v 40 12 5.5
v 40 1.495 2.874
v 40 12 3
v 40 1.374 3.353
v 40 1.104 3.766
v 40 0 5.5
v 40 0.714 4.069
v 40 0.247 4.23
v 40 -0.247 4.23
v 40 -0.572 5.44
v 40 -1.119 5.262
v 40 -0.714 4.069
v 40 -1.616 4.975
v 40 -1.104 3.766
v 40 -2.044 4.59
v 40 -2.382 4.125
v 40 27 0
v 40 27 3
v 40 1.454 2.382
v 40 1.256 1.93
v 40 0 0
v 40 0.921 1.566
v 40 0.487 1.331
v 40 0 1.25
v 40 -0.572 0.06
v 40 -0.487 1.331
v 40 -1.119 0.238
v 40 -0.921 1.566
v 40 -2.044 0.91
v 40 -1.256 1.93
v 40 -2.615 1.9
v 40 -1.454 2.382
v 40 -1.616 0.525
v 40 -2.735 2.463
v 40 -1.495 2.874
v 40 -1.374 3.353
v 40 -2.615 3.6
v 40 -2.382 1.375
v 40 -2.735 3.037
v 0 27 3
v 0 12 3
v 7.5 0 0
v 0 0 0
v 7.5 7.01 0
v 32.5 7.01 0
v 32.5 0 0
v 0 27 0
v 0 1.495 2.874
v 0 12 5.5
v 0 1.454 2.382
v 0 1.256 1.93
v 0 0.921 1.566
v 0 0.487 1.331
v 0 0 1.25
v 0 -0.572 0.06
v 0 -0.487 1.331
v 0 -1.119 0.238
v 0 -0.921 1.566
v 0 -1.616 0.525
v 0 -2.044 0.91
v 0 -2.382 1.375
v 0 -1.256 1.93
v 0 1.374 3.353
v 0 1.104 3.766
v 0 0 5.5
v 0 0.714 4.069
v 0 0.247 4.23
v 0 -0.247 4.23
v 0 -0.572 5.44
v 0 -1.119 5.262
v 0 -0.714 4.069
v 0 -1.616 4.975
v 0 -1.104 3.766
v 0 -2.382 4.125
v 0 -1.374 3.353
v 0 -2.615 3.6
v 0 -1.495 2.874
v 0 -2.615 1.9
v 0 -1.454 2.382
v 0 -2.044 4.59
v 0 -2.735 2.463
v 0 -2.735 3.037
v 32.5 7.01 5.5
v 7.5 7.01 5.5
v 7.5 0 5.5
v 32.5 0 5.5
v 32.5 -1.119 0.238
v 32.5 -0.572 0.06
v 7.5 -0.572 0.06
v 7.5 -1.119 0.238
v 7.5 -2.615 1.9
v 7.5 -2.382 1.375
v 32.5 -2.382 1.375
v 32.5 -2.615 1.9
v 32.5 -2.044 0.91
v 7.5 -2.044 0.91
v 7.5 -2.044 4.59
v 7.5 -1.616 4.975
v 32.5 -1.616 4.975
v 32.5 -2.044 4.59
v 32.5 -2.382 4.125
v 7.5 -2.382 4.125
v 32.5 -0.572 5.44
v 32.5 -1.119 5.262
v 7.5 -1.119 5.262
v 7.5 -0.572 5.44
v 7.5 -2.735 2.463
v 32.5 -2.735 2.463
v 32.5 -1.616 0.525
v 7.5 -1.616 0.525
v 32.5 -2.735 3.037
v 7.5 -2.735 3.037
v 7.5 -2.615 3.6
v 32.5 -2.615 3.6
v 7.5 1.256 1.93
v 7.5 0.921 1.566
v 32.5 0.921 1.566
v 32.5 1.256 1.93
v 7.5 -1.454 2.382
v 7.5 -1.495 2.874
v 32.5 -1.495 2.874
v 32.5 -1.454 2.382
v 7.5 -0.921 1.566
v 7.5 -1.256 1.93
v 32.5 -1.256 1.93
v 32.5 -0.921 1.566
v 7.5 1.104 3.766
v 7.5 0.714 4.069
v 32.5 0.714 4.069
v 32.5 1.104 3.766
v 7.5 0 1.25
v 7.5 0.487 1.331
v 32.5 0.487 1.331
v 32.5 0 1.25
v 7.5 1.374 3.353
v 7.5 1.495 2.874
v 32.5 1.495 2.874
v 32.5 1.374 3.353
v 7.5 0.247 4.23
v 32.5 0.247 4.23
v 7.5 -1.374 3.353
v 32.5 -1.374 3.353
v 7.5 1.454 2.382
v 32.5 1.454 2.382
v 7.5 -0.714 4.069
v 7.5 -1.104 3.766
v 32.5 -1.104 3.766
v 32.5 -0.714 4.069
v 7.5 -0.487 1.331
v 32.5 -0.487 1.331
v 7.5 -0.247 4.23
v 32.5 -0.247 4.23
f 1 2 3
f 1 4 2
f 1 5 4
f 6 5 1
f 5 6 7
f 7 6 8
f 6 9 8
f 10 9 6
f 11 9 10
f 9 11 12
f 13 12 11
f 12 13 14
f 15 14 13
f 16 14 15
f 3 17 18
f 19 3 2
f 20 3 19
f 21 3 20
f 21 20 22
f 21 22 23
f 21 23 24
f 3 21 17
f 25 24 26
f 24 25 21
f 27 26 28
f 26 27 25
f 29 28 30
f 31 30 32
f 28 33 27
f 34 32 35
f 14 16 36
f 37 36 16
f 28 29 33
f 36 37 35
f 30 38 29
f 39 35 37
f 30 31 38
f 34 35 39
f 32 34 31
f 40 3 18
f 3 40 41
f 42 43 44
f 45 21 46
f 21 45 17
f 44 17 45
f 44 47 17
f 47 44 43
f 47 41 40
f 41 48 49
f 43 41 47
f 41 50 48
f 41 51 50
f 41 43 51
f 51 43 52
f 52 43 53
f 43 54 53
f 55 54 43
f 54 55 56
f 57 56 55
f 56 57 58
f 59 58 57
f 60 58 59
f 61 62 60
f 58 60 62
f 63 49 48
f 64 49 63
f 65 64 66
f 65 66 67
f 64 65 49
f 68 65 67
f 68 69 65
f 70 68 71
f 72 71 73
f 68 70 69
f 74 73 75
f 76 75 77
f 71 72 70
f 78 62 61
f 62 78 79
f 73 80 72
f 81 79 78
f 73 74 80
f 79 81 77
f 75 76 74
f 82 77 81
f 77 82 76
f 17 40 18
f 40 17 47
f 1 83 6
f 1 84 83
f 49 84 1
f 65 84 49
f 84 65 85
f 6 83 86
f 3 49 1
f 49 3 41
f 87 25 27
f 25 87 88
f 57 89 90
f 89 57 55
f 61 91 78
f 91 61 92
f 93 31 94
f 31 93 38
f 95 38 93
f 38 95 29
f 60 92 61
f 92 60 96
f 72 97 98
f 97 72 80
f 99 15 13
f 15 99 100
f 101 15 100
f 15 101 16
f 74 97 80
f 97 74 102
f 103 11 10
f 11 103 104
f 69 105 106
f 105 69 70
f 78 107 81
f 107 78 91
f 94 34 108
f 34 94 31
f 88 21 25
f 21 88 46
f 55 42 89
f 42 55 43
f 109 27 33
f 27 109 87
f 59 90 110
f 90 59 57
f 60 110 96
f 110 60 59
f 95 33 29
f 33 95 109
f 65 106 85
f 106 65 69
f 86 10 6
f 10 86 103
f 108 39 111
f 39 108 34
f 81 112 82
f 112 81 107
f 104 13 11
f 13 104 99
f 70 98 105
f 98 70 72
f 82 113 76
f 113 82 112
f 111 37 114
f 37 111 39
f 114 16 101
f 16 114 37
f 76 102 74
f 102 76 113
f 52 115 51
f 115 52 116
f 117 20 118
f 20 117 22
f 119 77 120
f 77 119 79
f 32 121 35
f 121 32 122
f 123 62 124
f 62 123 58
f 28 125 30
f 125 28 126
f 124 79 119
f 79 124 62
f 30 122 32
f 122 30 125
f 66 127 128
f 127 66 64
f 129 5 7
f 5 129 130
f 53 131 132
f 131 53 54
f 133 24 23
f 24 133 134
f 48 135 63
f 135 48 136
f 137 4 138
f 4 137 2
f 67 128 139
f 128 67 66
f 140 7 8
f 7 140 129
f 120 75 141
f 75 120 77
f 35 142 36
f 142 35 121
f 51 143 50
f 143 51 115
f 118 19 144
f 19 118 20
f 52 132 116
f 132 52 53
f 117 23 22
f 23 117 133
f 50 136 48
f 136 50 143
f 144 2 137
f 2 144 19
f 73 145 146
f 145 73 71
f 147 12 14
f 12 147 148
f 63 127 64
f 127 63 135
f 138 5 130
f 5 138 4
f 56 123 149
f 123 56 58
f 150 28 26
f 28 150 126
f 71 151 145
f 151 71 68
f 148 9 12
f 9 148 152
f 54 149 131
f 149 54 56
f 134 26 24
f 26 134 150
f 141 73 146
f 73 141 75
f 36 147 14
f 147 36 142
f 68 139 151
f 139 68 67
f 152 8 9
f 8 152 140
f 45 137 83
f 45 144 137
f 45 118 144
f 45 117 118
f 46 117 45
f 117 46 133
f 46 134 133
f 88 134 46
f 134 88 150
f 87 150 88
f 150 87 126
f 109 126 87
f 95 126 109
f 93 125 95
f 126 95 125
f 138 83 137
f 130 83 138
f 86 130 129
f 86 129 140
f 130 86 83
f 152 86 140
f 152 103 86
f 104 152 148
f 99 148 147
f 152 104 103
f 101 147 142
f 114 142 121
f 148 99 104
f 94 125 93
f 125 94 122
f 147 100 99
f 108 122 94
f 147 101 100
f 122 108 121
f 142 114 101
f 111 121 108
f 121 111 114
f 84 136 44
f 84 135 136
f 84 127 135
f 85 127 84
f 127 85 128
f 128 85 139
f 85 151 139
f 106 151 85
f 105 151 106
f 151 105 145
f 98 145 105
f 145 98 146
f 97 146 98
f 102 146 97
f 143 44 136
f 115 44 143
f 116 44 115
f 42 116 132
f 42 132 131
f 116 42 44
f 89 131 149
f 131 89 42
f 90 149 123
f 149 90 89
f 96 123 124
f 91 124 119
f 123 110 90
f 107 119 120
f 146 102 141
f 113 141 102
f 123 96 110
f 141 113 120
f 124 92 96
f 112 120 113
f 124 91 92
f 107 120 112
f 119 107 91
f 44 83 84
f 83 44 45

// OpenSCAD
// Side hinge to work with slightly oversized door panels
//
// Copyright (C) 2021  Kevin O'Connor <kevin@koconnor.net>
//
// This file may be distributed under the terms of the GNU GPLv3 license.

screw_dia = 3.0;
pivot_dia = 5.5;
door_width = 40;
door_grip_height = 3;
door_grip_length = 15;
door_rail_length_overlap = 8;
door_hinge_height_offset = 2.5;
door_hinge_length_offset = 12;
hinge_width = 25;
panel_height = 3;
panel_grip_height = 2;
panel_grip_length = 7;
rail_length = 20;
rail_insert_length = 6;
insert_pillar_width = 5;
insert_pillar_height = 5;
screw_head_dia = 5.7;
CUT=.01;
$fs = 0.5;

//
// Hinge attached to door panel
//

module door_hinge() {
    full_length = door_grip_length + door_hinge_length_offset;
    full_height = pivot_dia;
    module grip() {
        // XXX - add corner filet?
        cube([door_width, full_length, door_grip_height]);
    }
    module brace() {
        cube([door_width, door_hinge_length_offset, full_height]);
    }

    module pivot() {
        translate([0, 0, pivot_dia/2])
            rotate([0, 90, 0])
                cylinder(d=pivot_dia, h=door_width);
    }
    module screwcut() {
        translate([-CUT, 0, pivot_dia/2])
            rotate([0, 90, 0])
                cylinder(d=screw_dia, h=door_width+2*CUT);
    }

    module hingecut() {
        brace_length_remaining = 5;
        x_offset = (door_width - hinge_width)/2;
        y = pivot_dia/2 + door_hinge_length_offset - brace_length_remaining;
        translate([x_offset, -(pivot_dia/2)-CUT, -CUT])
            cube([hinge_width, y+2*CUT, full_height+2*CUT]);
    }

    difference() {
        union() {
            grip();
            brace();
            pivot();
        }
        screwcut();
        hingecut();
    }
}

//
// Hinge attached to 2020 frame
//

module frame_hinge() {
    full_width = hinge_width - .5;
    beam_length_offset = (rail_length - rail_insert_length)/2;
    base_length = (door_hinge_height_offset + beam_length_offset
                   + rail_insert_length);
    base_height = panel_grip_height + panel_height;
    full_length = base_length + panel_grip_length;
    module panel_grip() {
        cube([full_width, full_length, panel_grip_height]);
    }
    module base() {
        cube([full_width, base_length, base_height]);
    }
    module rail_guide_pillars() {
        pillar_y = base_length - rail_insert_length;
        pillar_x = 0;
        height = panel_grip_height + panel_height + insert_pillar_height;
        translate([pillar_x, pillar_y, 0])
            cube([insert_pillar_width, rail_insert_length, height]);
        pillar_x2 = full_width - insert_pillar_width;
        translate([pillar_x2, pillar_y, 0])
            cube([insert_pillar_width, rail_insert_length, height]);
    }

    pivot_y = -(pivot_dia/2);
    pivot_rail_overlap = door_rail_length_overlap + door_hinge_length_offset;
    pivot_z = rail_length - pivot_rail_overlap + base_height;
    module pivot() {
        module main() {
            translate([0, pivot_y, pivot_z])
                rotate([0, 90, 0])
                    cylinder(d=pivot_dia, h=full_width);
        }
        extra_base_length = 2;
        hull() {
            main();
            translate([0, -extra_base_length, 0])
                cube([full_width, extra_base_length+CUT, base_height]);
        }
    }
    module pivotcut() {
        translate([-CUT, pivot_y, pivot_z])
            rotate([0, 90, 0])
                cylinder(d=screw_dia, h=full_width+2*CUT);
    }
    module screwcut() {
        x = full_width / 2;
        y = base_length - rail_insert_length/2;
        top_seal_height = panel_grip_height + panel_height;
        translate([x, y, -CUT])
            cylinder(d=screw_dia, h=top_seal_height+2*CUT);
        bury = 3;
        translate([x, y, -CUT])
            cylinder(d=screw_head_dia, h=bury+CUT);
        translate([x, y, bury-CUT])
            cylinder(d1=screw_head_dia, d2=screw_dia, h=1.5+CUT);
    }

    difference() {
        union() {
            panel_grip();
            base();
            rail_guide_pillars();
            pivot();
        }
        pivotcut();
        screwcut();
    }
}

//
// Object selection
//

door_hinge();
//frame_hinge();
